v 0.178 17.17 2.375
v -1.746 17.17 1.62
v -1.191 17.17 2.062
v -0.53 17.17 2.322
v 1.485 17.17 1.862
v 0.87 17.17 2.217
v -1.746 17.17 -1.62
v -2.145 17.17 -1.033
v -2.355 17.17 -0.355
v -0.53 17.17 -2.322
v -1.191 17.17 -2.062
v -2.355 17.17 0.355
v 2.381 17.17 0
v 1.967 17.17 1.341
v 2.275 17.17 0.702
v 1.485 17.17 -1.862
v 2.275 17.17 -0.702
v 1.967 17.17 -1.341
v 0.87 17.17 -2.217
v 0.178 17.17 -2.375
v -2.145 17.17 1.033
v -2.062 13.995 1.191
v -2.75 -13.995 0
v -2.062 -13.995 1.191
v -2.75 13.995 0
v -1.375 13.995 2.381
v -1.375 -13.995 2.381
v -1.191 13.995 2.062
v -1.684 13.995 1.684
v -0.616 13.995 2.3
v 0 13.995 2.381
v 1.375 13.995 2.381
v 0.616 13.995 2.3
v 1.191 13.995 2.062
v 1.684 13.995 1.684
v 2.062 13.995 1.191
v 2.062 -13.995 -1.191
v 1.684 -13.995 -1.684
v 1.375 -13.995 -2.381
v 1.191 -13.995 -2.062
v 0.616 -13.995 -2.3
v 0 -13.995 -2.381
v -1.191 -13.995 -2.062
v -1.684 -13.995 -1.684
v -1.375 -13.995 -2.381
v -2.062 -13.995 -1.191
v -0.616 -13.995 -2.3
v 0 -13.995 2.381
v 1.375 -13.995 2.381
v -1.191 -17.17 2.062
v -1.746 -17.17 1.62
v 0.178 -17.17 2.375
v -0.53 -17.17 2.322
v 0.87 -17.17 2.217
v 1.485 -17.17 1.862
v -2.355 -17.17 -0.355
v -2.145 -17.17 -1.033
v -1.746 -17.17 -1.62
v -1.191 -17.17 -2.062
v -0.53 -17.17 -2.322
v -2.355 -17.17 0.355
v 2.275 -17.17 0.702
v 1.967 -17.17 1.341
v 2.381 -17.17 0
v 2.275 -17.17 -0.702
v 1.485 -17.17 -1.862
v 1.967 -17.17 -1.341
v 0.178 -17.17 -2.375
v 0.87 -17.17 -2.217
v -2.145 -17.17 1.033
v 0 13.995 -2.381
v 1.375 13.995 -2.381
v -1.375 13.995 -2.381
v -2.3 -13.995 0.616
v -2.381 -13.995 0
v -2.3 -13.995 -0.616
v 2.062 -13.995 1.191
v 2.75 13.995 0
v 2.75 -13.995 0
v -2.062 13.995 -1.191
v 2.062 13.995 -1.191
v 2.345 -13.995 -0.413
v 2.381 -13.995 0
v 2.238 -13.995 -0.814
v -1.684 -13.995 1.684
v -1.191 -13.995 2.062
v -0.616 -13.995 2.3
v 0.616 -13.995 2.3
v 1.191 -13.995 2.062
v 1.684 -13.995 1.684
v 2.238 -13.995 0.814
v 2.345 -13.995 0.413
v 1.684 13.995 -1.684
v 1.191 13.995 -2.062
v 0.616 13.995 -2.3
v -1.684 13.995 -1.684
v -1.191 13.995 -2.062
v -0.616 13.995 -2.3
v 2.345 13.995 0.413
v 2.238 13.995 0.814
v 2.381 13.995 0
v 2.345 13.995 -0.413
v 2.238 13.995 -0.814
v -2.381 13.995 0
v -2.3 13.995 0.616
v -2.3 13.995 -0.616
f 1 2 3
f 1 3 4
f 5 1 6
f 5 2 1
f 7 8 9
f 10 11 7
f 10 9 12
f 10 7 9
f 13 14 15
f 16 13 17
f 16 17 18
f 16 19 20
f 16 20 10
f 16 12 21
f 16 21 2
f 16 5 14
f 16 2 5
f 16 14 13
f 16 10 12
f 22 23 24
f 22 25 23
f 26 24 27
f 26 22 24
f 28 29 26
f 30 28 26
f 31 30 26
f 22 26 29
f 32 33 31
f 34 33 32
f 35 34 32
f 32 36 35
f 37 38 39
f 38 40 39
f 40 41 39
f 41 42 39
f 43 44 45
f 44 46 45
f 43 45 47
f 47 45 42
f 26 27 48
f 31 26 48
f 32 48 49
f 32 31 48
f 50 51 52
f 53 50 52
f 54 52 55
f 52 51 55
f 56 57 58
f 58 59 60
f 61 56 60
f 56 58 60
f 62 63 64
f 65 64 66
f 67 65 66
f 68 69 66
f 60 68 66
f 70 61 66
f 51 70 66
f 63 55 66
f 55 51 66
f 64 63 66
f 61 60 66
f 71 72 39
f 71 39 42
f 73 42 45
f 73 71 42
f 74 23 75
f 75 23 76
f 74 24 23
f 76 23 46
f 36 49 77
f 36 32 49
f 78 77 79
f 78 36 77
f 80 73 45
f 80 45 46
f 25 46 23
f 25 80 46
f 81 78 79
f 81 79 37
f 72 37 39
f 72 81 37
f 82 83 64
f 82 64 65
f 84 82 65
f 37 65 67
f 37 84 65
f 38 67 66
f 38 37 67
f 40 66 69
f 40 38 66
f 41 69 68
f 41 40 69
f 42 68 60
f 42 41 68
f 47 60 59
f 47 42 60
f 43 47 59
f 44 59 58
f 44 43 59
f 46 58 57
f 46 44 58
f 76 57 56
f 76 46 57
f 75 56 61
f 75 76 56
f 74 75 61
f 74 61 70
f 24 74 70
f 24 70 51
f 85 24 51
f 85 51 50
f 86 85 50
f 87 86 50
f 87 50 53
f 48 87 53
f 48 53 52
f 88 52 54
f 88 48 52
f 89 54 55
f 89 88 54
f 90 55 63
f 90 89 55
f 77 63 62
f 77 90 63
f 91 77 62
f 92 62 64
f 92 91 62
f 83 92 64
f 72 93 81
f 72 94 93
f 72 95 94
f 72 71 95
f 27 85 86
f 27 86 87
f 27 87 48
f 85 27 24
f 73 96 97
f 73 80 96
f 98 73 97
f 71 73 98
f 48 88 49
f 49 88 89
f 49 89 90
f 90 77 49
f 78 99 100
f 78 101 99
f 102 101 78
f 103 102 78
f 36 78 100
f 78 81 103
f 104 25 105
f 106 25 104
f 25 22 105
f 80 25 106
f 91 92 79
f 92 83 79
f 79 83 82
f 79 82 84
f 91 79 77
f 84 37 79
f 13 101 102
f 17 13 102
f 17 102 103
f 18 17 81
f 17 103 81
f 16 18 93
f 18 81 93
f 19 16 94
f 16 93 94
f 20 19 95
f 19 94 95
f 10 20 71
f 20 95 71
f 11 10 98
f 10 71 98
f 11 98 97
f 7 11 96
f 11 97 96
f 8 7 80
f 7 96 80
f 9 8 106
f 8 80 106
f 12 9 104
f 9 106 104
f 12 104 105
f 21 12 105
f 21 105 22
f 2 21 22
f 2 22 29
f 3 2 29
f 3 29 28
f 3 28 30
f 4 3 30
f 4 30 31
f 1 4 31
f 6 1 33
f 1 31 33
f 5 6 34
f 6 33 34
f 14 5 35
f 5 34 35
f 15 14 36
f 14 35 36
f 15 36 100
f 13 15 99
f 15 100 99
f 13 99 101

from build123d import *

# Parameters (mm, degrees)
BOSS_EXTRUDE1_DEPTH = 13.9954
SKETCH2_R           = 2.38125
BOSS_EXTRUDE2_DEPTH = 3.175


with BuildPart() as part:
    # Sketch1 → Boss-Extrude1 (new body, symmetric)
    with BuildSketch(Plane(origin=(0, 0, 0), x_dir=(1, 0, 0), z_dir=(0, 1, 0))):
        Polygon((1.374815329, -2.38125), (2.749630657, 0), (1.374815329, 2.38125), (-1.374815329, 2.38125), (-2.749630657, 0), (-1.374815329, -2.38125), align=None)
    extrude(amount=BOSS_EXTRUDE1_DEPTH, both=True)

    # Sketch2 → Boss-Extrude2 (add)
    with BuildSketch(Plane(origin=(0, 13.9954, 0), x_dir=(1, 0, 0), z_dir=(0, 1, 0))):
        Circle(SKETCH2_R)
    boss_extrude2 = extrude(amount=BOSS_EXTRUDE2_DEPTH)

    # Mirror1: Boss-Extrude2 across plane
    add(boss_extrude2.mirror(Plane.ZX))


solid = part.part
